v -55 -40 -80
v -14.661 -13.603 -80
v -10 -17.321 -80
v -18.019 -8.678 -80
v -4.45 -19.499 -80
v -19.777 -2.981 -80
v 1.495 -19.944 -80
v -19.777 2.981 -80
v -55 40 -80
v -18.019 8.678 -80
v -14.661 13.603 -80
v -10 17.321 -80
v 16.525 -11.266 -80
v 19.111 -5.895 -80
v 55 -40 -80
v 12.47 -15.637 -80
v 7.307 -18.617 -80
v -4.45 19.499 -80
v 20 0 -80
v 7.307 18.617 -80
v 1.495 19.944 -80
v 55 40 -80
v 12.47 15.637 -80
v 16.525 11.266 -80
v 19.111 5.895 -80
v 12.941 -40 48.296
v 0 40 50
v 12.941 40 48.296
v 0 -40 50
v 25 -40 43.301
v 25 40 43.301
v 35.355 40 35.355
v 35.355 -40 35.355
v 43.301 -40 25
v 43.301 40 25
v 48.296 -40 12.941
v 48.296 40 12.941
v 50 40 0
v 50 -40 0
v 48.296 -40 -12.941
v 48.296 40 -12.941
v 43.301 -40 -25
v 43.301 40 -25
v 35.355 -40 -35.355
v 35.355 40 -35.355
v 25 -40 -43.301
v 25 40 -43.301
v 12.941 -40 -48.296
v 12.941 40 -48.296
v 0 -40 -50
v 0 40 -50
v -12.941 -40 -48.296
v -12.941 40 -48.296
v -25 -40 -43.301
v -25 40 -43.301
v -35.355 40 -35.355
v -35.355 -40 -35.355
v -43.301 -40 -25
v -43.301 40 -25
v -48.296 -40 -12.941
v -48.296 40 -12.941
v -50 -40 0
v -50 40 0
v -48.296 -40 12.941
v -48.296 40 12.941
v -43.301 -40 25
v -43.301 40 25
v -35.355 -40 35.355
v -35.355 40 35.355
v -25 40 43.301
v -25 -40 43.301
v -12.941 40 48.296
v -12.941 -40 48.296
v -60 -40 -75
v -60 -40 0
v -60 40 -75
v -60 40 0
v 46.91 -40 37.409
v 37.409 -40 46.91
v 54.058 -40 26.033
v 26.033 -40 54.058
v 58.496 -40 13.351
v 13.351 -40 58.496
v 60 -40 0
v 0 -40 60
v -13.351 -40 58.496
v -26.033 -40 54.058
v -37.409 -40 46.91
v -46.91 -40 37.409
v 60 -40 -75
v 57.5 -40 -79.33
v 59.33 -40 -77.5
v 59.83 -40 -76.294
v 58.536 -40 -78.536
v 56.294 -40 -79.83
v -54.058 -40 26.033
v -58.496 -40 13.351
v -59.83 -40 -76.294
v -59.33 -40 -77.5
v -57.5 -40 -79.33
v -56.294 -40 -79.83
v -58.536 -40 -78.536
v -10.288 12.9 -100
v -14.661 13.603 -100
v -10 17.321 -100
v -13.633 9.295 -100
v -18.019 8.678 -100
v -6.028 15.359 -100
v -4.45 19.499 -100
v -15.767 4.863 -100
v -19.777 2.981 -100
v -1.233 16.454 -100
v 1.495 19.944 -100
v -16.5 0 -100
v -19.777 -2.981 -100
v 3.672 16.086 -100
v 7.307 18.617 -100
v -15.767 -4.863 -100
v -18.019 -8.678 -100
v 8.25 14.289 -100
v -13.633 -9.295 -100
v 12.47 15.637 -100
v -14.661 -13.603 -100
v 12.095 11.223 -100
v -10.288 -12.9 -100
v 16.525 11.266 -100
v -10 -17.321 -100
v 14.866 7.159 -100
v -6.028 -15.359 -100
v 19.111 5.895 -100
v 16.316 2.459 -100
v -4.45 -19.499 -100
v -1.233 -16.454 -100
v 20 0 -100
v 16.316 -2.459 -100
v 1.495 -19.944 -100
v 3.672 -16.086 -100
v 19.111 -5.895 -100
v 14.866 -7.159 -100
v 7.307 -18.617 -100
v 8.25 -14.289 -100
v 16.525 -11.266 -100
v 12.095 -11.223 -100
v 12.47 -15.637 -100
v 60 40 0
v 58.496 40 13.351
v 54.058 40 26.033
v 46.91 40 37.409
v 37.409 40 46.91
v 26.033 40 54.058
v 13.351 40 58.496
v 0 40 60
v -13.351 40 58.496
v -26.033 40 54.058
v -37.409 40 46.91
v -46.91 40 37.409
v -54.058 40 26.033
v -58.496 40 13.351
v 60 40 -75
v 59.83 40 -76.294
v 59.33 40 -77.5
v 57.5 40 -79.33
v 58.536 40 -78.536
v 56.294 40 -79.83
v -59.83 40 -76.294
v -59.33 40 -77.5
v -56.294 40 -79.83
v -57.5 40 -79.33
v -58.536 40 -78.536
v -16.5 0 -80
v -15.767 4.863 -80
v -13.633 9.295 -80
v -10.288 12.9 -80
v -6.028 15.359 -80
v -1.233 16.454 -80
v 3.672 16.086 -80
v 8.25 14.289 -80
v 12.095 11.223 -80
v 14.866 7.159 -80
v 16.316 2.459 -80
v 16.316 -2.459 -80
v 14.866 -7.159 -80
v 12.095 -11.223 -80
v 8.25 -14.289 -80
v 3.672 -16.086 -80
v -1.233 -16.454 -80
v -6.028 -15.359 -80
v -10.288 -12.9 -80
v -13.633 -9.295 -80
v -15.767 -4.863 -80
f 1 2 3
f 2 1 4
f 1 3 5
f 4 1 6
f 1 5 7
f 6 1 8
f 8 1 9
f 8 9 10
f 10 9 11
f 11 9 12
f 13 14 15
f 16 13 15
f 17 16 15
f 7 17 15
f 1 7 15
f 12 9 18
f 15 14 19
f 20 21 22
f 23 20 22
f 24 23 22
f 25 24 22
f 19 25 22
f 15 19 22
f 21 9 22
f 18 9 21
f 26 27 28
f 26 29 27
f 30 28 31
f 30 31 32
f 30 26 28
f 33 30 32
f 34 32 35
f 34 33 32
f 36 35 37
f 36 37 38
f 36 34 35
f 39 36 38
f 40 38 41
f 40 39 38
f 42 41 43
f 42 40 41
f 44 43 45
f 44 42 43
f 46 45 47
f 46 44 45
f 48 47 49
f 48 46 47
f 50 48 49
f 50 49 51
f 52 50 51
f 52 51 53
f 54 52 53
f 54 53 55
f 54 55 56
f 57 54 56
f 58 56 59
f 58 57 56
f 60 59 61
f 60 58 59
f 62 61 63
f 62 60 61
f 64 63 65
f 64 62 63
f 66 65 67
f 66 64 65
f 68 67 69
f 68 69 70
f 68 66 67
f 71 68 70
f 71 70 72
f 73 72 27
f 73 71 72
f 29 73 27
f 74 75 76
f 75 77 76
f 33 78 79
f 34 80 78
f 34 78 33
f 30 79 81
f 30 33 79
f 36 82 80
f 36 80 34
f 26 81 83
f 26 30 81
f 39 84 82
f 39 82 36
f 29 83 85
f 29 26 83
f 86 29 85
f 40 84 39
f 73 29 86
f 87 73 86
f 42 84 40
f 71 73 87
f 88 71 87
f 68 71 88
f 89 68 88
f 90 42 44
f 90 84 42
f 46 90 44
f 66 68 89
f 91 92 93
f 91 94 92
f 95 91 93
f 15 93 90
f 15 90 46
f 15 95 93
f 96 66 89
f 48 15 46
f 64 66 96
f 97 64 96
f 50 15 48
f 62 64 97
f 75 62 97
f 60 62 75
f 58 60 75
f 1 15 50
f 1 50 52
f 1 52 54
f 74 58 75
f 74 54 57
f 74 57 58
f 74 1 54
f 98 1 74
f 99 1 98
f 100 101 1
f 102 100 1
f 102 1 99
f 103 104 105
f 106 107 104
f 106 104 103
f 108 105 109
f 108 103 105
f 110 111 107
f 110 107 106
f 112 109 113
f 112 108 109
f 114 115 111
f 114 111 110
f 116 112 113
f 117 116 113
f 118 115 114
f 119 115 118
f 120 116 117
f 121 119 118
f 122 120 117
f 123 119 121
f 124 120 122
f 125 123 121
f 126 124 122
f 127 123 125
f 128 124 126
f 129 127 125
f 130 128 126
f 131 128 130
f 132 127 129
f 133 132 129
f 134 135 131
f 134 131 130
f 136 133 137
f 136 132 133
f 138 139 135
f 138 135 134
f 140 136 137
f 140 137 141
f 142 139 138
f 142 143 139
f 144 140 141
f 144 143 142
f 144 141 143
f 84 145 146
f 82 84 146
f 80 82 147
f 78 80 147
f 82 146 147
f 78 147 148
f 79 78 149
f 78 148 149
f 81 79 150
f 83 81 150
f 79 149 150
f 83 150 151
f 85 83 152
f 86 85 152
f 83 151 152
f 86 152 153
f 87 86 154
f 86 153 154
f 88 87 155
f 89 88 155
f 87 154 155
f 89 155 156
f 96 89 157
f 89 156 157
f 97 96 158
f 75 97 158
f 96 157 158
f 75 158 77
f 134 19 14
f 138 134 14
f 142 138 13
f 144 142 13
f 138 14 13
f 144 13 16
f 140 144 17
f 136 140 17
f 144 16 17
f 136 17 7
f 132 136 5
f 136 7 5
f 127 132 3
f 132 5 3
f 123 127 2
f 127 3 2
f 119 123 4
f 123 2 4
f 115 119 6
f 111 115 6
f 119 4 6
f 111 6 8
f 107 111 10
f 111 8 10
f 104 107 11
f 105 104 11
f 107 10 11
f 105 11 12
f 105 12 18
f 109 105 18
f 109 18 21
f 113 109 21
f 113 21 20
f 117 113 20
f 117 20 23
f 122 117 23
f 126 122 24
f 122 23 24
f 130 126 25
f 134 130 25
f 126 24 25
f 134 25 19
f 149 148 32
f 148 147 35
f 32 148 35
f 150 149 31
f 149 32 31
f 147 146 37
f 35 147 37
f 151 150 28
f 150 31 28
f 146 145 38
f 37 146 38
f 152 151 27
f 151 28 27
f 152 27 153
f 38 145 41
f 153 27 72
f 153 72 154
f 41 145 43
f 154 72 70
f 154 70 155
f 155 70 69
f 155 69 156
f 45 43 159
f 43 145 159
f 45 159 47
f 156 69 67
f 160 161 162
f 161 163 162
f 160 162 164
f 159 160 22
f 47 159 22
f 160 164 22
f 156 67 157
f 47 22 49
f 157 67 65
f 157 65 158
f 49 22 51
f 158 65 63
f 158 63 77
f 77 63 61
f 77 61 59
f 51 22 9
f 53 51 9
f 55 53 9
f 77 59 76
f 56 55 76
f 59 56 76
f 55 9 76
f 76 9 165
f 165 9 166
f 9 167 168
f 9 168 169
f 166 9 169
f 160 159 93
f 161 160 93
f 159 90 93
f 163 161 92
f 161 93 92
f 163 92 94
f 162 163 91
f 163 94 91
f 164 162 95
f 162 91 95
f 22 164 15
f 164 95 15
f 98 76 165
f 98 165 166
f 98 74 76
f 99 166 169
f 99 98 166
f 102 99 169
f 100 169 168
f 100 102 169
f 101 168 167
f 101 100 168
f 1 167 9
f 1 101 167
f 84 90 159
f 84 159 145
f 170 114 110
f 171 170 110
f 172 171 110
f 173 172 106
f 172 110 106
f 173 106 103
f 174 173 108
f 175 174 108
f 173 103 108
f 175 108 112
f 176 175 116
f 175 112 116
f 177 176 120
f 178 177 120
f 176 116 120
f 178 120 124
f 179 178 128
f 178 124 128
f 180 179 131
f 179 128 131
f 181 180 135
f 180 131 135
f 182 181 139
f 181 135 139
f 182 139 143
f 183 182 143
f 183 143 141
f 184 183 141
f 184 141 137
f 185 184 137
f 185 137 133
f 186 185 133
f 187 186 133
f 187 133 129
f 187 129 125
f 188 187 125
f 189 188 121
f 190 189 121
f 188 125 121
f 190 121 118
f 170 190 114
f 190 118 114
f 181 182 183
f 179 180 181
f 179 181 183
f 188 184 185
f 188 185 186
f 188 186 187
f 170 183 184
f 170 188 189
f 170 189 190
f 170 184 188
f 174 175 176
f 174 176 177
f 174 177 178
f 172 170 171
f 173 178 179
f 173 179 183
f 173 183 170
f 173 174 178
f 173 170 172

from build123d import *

# Parameters (mm, degrees)
SKETCH1_R           = 50
BOSS_EXTRUDE1_DEPTH = 40
FILLET1_R           = 5
SKETCH2_R           = 20
BOSS_EXTRUDE2_DEPTH = 20
SKETCH7_R           = 16.5
CUT_EXTRUDE1_DEPTH  = 20


with BuildPart() as part:
    # Sketch1 → Boss-Extrude1 (new, symmetric)
    with BuildSketch(Plane(origin=(0, 0, 0), x_dir=(1, 0, 0), z_dir=(0, 1, 0))):
        with BuildLine():
            Line((-60, 0), (-60, 80))
            Line((-60, 80), (60, 80))
            Line((60, 80), (60, 0))
            ThreePointArc((60, 0), (0, -60), (-60, 0))
        make_face()
        with Locations(Location((0, 0, 0), (0, 0, 270))):
            Circle(SKETCH1_R, mode=Mode.SUBTRACT)
    extrude(amount=BOSS_EXTRUDE1_DEPTH, both=True)

    # Fillet1
    fillet1_edges = [part.edges().sort_by_distance(p)[0] for p in [
        (-60, 0, -80),
        (60, 0, -80),
    ]]
    fillet(fillet1_edges, radius=FILLET1_R)

    # Sketch2 → Boss-Extrude2 (add)
    with BuildSketch(Plane(origin=(0, 0, -80), x_dir=(-1, 0, 0), z_dir=(0, 0, -1))):
        with Locations(Location((0, 0, 0), (0, 0, 180))):
            Circle(SKETCH2_R)
    extrude(amount=BOSS_EXTRUDE2_DEPTH)

    # Sketch7 → Cut-Extrude1 (cut)
    with BuildSketch(Plane(origin=(0, 0, -100), x_dir=(-1, 0, 0), z_dir=(0, 0, -1))):
        Circle(SKETCH7_R)
    extrude(amount=-CUT_EXTRUDE1_DEPTH, mode=Mode.SUBTRACT)


solid = part.part
